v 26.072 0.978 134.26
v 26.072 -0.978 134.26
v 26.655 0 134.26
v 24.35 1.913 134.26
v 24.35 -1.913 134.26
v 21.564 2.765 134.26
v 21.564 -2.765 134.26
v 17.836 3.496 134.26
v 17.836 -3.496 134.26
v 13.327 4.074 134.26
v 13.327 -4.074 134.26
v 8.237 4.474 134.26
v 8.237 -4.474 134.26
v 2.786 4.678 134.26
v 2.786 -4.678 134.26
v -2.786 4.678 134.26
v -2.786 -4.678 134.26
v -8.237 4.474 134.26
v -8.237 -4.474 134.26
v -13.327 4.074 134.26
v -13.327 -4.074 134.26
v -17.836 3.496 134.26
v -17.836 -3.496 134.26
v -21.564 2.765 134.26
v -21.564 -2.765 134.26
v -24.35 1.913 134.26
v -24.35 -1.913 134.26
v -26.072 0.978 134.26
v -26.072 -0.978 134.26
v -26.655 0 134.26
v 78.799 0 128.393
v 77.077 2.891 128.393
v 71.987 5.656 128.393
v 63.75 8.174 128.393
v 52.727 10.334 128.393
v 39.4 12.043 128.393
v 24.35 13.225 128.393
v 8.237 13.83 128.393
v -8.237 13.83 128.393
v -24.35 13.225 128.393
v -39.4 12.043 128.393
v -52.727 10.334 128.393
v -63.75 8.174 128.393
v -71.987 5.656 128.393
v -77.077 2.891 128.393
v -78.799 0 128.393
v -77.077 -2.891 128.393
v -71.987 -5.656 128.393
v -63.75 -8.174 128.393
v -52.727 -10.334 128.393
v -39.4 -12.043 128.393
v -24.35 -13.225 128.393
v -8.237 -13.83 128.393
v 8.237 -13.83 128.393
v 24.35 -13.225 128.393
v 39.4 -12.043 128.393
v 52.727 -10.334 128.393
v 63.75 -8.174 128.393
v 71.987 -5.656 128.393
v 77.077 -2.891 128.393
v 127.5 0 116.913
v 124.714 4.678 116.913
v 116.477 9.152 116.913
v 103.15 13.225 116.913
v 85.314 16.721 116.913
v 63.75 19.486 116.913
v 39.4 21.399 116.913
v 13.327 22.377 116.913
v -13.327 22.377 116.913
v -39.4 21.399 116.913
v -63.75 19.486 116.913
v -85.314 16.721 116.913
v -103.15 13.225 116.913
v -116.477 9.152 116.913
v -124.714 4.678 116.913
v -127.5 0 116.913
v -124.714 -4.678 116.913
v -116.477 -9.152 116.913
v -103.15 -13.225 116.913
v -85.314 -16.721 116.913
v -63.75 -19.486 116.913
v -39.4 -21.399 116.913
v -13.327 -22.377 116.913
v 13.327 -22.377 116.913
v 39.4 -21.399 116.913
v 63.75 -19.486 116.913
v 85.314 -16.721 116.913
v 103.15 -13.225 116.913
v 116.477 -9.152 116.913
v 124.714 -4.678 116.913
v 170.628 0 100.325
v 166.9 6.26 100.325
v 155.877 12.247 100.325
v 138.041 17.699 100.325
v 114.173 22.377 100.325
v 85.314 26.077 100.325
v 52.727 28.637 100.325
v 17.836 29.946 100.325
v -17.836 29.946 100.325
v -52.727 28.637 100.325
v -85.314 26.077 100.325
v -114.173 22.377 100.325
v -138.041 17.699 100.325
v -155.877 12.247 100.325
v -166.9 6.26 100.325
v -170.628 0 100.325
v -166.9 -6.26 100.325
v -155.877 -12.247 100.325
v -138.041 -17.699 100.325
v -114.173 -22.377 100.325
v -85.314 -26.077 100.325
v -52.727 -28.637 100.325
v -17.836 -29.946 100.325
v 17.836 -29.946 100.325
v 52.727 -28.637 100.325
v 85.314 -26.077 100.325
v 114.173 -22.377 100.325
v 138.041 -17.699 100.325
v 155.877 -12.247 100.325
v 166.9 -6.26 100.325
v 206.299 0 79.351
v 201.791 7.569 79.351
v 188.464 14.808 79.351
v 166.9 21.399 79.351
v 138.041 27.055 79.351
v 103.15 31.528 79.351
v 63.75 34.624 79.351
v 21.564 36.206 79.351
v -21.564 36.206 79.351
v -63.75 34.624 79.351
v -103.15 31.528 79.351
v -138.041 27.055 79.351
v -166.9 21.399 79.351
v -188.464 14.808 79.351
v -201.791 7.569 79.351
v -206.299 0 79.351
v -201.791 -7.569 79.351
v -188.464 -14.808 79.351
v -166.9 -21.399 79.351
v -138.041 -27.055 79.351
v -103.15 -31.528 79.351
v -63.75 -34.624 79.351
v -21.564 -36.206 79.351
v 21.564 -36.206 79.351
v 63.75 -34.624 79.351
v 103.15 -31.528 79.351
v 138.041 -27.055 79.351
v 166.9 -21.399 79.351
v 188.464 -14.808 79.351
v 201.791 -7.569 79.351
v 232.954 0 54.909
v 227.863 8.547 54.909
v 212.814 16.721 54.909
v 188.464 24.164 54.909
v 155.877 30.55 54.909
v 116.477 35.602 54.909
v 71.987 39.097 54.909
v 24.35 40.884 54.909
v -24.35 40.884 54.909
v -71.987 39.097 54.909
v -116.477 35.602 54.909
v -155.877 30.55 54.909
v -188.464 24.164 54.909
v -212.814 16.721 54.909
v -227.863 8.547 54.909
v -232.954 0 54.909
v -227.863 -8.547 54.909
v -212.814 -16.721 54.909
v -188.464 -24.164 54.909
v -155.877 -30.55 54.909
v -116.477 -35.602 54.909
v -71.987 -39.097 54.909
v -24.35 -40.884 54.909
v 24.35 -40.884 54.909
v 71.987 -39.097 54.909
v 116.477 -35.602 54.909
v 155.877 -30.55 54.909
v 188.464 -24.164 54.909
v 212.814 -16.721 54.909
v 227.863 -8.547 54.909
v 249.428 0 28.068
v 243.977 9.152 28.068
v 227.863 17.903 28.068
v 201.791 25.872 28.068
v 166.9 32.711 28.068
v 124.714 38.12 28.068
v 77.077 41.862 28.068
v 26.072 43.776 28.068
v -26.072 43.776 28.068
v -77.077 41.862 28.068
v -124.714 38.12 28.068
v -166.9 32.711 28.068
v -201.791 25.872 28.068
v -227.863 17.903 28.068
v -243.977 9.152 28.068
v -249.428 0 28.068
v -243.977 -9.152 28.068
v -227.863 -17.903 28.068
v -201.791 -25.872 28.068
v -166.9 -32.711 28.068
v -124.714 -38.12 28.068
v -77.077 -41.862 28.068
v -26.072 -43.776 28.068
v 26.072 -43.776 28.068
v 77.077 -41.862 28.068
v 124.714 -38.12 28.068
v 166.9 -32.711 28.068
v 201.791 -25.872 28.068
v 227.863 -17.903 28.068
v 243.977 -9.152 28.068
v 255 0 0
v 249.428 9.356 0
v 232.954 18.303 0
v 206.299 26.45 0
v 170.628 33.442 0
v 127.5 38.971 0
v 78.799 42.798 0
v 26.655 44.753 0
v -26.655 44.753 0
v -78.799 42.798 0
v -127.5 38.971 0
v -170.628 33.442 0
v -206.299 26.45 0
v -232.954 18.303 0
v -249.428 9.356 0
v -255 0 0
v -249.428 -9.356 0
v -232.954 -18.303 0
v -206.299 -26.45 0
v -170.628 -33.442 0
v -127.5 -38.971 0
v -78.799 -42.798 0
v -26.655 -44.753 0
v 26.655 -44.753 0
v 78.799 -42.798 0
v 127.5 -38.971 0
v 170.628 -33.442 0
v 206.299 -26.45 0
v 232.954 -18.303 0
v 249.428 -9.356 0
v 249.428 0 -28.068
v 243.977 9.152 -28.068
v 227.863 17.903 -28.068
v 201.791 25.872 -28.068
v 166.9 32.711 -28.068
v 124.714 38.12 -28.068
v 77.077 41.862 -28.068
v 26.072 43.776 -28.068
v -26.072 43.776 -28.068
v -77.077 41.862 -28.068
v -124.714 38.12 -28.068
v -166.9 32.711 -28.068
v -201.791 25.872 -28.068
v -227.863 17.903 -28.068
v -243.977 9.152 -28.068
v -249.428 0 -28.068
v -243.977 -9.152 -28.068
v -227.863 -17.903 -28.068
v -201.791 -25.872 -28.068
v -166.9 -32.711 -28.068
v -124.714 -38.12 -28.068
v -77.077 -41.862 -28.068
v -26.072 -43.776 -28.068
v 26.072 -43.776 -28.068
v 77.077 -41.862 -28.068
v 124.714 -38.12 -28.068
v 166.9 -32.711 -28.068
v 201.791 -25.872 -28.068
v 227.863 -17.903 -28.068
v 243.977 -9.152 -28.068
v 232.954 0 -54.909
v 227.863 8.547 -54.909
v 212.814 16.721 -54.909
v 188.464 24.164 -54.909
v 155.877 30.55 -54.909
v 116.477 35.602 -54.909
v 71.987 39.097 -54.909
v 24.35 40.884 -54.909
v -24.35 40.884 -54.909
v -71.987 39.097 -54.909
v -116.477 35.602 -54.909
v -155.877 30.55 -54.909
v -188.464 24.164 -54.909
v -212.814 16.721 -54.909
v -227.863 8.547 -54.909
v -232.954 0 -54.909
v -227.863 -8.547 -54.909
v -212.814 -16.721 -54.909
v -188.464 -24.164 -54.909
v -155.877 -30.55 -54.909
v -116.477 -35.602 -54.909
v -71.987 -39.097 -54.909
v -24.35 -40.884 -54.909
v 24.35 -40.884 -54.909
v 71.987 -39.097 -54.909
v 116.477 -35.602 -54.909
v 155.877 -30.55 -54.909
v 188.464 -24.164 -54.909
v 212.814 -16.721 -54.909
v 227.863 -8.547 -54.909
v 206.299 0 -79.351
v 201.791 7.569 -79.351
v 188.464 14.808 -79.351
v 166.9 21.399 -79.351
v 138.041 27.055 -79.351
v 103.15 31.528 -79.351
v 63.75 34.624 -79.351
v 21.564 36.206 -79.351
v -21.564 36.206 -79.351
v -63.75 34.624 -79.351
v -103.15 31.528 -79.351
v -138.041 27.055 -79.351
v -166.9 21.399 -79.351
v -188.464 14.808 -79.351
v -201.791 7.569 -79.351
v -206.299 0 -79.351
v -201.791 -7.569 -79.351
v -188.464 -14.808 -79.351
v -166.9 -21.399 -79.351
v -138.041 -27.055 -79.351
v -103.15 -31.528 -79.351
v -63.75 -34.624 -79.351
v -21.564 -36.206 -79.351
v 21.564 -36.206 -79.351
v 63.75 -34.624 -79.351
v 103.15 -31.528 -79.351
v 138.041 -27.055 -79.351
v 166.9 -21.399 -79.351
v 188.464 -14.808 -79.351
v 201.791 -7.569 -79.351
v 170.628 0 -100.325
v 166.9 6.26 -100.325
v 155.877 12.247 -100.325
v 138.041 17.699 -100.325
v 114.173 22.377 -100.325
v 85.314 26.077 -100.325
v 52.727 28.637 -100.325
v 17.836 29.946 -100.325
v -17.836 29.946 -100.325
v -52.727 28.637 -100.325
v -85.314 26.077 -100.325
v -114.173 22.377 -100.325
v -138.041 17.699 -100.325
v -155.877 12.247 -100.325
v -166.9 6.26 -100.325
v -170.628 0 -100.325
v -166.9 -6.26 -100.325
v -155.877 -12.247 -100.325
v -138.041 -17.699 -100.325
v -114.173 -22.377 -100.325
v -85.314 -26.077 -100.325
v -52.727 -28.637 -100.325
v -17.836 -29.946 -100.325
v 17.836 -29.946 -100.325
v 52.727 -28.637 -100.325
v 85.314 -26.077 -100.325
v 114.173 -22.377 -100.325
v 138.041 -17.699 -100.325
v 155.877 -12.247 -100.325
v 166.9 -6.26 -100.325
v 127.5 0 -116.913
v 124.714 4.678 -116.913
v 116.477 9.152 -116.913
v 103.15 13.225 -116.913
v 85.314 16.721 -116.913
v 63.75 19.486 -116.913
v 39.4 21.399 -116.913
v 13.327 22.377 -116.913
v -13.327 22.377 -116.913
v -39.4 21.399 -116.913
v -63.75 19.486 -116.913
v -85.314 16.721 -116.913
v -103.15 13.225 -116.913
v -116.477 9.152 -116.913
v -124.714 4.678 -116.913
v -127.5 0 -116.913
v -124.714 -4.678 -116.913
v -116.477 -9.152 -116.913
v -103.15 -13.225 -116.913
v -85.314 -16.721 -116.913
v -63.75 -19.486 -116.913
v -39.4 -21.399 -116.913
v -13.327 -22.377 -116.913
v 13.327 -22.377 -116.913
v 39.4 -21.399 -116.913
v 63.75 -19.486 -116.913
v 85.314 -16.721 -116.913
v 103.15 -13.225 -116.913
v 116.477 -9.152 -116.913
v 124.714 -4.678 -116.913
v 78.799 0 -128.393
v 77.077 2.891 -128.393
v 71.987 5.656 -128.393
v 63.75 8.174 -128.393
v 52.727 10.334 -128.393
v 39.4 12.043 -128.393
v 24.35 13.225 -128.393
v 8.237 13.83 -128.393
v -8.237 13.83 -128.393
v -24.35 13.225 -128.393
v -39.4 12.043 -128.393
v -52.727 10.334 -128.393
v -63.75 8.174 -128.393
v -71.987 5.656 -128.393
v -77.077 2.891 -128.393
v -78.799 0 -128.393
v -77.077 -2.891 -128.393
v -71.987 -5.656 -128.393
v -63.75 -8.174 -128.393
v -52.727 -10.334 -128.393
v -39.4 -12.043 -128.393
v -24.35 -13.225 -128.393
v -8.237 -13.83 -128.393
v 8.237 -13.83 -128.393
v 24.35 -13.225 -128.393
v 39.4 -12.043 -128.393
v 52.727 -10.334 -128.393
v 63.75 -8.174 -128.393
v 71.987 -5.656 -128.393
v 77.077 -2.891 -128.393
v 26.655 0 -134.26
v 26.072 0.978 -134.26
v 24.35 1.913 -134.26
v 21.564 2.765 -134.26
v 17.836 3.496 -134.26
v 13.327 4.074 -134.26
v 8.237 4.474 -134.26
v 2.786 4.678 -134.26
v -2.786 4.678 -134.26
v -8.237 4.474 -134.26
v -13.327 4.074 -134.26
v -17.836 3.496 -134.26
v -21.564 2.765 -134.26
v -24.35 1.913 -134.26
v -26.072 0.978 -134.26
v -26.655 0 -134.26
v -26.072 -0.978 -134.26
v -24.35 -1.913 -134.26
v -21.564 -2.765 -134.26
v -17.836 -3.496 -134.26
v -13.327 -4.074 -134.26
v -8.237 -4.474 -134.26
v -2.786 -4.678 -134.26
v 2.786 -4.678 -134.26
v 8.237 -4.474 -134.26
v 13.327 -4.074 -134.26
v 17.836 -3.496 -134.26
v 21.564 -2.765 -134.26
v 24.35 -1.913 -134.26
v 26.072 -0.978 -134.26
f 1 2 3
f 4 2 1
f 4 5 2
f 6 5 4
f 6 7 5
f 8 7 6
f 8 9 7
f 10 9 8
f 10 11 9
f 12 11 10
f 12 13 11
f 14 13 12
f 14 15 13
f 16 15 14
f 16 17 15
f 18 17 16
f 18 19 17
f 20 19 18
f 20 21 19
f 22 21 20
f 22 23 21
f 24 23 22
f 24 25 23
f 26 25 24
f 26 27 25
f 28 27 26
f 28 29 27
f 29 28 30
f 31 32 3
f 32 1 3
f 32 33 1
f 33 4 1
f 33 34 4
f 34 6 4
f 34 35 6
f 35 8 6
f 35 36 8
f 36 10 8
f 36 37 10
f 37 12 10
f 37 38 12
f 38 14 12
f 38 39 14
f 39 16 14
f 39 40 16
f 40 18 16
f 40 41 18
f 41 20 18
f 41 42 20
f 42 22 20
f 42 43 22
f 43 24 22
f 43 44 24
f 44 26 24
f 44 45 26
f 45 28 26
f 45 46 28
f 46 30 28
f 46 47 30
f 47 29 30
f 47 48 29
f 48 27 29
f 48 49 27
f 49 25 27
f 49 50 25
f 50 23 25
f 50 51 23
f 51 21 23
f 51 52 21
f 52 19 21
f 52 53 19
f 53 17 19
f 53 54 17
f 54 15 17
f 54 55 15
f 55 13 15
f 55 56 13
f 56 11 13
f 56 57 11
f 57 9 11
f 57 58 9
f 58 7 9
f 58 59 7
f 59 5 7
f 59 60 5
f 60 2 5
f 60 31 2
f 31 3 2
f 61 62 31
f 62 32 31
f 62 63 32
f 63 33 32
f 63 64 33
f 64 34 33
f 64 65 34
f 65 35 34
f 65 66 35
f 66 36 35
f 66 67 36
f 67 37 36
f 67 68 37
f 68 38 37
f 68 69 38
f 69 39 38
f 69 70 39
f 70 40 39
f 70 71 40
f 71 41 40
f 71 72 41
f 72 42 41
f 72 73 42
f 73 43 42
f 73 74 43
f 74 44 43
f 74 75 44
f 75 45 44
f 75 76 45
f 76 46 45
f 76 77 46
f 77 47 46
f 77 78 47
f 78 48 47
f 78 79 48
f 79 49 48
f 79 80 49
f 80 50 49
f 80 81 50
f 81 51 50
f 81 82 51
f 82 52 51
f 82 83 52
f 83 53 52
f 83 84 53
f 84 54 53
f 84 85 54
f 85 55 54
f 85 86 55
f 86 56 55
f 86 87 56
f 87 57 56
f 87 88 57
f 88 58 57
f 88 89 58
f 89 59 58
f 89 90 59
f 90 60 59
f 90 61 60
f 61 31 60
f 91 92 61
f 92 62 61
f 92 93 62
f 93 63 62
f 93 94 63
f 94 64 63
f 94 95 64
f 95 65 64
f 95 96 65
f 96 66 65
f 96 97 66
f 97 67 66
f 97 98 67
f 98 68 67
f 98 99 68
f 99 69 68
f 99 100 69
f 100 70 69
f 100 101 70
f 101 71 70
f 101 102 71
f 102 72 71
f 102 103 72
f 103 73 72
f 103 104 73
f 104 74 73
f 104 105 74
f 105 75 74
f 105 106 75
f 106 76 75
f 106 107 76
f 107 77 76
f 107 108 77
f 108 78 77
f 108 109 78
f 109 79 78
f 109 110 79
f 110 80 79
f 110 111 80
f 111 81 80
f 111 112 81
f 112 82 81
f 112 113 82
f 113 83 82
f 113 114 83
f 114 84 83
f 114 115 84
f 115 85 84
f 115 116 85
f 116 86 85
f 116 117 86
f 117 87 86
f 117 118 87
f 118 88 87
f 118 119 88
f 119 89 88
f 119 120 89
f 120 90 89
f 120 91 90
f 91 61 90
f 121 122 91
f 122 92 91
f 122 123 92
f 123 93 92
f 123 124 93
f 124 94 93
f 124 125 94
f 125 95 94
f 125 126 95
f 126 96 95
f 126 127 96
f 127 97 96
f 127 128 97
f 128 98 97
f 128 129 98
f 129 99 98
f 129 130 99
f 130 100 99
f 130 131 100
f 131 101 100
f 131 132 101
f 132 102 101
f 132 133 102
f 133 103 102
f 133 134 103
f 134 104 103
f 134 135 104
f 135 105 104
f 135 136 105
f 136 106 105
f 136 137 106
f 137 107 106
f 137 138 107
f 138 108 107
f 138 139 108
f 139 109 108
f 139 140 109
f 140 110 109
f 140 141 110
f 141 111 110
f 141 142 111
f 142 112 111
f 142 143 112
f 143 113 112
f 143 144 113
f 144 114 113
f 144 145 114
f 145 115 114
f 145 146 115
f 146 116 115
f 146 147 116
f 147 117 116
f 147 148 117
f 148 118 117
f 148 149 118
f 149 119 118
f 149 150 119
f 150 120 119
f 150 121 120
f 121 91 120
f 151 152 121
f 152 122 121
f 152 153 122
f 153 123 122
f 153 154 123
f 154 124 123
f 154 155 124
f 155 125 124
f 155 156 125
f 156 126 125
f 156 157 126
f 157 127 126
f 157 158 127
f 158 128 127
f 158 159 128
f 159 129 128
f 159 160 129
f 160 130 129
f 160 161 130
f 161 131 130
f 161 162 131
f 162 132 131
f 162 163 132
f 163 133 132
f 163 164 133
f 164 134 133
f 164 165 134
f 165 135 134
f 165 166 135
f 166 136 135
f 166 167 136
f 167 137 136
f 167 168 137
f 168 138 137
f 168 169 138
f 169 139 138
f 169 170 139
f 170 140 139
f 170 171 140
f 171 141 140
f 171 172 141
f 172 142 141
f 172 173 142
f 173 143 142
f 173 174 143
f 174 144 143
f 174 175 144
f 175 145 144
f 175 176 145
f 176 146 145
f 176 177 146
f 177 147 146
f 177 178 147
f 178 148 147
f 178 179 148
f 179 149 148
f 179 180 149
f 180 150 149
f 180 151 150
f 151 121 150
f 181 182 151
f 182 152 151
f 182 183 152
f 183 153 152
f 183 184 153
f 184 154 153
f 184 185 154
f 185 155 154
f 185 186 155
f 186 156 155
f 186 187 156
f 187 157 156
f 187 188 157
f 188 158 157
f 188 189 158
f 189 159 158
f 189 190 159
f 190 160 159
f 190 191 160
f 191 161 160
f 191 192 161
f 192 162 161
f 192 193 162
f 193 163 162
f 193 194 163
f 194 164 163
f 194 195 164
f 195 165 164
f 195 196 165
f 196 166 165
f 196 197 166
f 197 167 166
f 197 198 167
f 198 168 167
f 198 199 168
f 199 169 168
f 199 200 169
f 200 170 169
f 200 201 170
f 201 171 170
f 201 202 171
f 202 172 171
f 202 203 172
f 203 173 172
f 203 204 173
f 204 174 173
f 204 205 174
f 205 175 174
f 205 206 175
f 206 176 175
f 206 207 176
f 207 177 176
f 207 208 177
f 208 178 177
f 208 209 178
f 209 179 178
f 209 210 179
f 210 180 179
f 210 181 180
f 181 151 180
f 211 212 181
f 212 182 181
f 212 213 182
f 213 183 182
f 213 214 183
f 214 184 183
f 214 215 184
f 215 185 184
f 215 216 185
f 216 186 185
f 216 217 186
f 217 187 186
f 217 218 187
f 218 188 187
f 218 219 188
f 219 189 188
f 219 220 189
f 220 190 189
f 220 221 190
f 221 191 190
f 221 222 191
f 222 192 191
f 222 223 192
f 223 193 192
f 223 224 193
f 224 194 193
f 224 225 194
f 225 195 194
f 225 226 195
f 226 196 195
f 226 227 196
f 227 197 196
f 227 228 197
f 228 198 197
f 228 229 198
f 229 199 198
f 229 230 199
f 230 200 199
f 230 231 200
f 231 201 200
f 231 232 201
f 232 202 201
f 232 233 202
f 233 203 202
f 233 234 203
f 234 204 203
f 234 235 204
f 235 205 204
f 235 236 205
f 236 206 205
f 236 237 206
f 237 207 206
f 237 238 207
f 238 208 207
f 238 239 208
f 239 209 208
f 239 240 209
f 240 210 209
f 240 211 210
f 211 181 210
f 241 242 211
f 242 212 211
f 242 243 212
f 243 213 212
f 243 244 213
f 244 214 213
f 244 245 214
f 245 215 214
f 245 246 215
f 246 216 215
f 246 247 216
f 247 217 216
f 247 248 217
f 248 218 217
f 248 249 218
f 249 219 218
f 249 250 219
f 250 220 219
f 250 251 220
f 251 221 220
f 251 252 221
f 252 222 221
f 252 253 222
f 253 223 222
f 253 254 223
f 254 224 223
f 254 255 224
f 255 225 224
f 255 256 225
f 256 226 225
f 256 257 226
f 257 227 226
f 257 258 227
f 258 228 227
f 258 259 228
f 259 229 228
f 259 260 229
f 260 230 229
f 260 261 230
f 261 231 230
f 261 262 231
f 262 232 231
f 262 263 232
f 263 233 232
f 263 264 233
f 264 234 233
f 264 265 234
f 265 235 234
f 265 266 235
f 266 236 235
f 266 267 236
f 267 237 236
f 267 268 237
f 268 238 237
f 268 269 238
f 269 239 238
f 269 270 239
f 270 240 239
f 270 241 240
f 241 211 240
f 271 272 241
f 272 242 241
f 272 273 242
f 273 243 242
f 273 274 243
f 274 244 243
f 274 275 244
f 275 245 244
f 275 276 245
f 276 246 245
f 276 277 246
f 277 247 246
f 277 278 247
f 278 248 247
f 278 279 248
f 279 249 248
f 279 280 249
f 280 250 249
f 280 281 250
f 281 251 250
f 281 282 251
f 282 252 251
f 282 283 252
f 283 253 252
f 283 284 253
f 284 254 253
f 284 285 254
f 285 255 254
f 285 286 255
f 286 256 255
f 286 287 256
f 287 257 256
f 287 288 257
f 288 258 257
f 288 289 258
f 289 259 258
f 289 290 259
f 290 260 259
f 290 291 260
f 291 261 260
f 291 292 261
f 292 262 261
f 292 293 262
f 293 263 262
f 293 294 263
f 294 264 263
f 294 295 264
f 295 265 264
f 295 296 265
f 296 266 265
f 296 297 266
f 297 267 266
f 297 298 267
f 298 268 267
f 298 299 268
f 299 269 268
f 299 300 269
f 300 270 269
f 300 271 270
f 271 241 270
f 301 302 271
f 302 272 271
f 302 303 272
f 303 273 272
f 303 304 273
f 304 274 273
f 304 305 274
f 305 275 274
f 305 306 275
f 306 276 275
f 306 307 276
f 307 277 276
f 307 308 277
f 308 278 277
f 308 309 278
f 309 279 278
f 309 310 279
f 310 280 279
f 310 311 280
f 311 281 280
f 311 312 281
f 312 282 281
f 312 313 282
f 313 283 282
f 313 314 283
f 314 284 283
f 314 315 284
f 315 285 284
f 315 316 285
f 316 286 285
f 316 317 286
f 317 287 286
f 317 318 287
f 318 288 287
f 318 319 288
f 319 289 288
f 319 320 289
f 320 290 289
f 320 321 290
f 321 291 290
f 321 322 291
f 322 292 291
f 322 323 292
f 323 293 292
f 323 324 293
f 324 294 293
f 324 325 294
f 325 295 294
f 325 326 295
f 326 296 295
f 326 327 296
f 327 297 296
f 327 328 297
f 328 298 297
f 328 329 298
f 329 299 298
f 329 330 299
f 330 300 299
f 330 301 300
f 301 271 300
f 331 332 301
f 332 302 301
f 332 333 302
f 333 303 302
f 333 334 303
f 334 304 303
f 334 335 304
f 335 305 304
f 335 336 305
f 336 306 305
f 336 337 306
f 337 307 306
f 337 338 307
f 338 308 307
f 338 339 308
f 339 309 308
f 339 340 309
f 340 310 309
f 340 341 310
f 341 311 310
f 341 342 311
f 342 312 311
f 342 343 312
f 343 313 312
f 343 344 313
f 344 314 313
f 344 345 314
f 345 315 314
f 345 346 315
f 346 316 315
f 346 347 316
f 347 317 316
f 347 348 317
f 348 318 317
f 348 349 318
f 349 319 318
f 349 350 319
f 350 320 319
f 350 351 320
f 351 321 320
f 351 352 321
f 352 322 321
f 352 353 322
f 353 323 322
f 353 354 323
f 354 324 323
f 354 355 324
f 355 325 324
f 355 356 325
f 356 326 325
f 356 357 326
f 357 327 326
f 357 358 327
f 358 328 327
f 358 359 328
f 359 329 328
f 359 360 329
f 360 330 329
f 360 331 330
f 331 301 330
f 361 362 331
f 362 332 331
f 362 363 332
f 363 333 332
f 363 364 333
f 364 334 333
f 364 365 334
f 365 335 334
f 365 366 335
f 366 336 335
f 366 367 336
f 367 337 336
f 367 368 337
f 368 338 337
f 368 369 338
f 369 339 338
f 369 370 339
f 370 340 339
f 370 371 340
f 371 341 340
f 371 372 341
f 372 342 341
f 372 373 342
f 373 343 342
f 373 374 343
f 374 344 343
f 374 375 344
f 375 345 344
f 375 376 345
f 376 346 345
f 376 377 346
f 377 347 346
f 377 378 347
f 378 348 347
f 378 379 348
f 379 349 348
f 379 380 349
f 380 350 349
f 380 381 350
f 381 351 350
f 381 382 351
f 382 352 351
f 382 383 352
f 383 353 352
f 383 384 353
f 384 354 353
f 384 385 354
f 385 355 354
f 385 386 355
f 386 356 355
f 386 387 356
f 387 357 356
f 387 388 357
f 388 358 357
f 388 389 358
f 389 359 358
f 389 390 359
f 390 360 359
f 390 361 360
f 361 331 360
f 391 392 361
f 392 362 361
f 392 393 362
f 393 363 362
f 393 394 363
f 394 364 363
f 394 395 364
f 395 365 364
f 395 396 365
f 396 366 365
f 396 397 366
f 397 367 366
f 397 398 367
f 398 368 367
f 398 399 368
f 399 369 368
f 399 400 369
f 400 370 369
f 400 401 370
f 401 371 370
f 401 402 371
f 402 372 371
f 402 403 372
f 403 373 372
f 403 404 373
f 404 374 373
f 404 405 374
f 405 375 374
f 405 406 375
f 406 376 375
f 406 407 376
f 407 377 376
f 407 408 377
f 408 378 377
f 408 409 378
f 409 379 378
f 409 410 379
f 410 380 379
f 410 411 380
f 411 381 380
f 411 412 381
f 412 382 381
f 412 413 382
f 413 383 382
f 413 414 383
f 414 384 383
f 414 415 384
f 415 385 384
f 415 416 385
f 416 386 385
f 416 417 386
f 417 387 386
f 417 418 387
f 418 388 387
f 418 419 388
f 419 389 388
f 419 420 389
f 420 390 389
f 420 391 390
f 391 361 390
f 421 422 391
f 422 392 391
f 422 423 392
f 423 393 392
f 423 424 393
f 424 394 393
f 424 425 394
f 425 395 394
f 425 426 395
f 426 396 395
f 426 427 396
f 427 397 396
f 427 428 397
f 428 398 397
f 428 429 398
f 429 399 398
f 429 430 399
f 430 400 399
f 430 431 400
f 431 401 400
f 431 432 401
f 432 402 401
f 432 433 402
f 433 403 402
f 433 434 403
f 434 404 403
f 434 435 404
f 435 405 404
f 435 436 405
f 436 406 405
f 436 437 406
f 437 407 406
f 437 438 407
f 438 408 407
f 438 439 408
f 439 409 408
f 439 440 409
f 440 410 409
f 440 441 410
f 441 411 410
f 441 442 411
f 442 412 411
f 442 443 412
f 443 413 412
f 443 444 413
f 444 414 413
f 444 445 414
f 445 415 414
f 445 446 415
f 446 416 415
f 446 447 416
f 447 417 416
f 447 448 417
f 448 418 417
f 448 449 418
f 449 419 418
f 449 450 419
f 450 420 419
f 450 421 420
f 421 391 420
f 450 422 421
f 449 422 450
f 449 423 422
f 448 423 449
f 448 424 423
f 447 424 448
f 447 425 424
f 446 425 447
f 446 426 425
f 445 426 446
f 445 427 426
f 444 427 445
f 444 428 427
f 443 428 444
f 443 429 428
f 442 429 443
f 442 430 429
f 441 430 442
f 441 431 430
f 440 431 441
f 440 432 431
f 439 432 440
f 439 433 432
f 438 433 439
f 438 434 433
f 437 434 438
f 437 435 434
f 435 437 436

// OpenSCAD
// Generated by SolidPython 1.0.1 on 2020-07-29 00:46:52


scale(v = [17, 3, 9]) {
	sphere(r = 15);
}
/***********************************************
*********      SolidPython code:      **********
************************************************
 
# import packages: SolidPython
from solid import *
from solid.utils import *
from itertools import chain, combinations, permutations


class Resize:

    def __init__(self, scad_file):
        self.scad_file = scad_file
        #self.scad_file = import_scad(scad_file)
        # cone/cylinder param:
        self.r1 = 0
        self.r2 = 0
        self.h = 0
        # rectangular prism param:
        self.w = 0
        self.l = 0
        # ellipse param:
        self.r = 0

    # import OpenScad code (file name corresponds to shape)


    # classify shape + parameters
    def assign(self, param1, param2, param3):
        if self.scad_file == 'cone.scad':
            self.r1 = param1
            self.r2 = param2
            self.h = param3
        elif self.scad_file == 'cylinder.scad':
            self.r1 = param1
            self.r2 = param2
            self.h = param3
        elif self.scad_file == 'rectangularPrism.scad':
            self.h = param1
            self.l = param2
            self.w = param3
        else:
            self.r = param1
            self.h = param2

    # resize parameters
    def iterate(self):
        x = range(3, 20, 2)
        i = 1
        if self.scad_file == 'cone.scad':
            tempList = list(permutations(x, 2))
            for temp in tempList:
                param1 = temp[0]
                param2 = temp[1]
                filepath = 'produced_scad_files/' + 'cone' + str(param1) + '_' + str(param2) + '_' + '.scad'
                scad_render_to_file(cylinder(h=param1, r1=param2, r2=0), filepath)

        elif self.scad_file == 'cylinder.scad':
            tempList = list(permutations(x, 3))
            for temp in tempList:
                param1 = temp[0]
                param2 = temp[1]
                filepath = 'produced_scad_files/' + 'cylinder' + str(param1) + '_' + str(param2) + '_' + '.scad'
                scad_render_to_file(cylinder(h=param1, r1=param2, r2=param2), filepath)

        elif self.scad_file == 'rectangularPrism.scad':
            tempList = list(permutations(x, 3))
            for temp in tempList:
                param1 = temp[0]
                param2 = temp[1]
                param3 = temp[2]
                filepath = 'produced_scad_files/' + 'rectangularPrism' + str(param1) + '_' + str(param2) + '_' + str(
                    param3) + '.scad'
                scad_render_to_file(cube(size=(param1, param2, param3)), filepath)

        elif self.scad_file == 'ellipse.scad':
            tempList = list(permutations(x, 4))
            for temp in tempList:
                param1 = temp[0]
                param2 = temp[1]
                param3 = temp[2]
                param4 = temp[3]
                filepath = 'produced_scad_files/' + 'ellipse' + str(param1) + '_' + str(param2) + '_' + str(param3) + '_' + str(param4) + '.scad'
                scad_render_to_file(scale([param1, param2, param3])(sphere(r=param4)), filepath)

    def render_to_scadfile(self):
        scad_render_to_file(scad, 'example.scad') 
 
************************************************/
